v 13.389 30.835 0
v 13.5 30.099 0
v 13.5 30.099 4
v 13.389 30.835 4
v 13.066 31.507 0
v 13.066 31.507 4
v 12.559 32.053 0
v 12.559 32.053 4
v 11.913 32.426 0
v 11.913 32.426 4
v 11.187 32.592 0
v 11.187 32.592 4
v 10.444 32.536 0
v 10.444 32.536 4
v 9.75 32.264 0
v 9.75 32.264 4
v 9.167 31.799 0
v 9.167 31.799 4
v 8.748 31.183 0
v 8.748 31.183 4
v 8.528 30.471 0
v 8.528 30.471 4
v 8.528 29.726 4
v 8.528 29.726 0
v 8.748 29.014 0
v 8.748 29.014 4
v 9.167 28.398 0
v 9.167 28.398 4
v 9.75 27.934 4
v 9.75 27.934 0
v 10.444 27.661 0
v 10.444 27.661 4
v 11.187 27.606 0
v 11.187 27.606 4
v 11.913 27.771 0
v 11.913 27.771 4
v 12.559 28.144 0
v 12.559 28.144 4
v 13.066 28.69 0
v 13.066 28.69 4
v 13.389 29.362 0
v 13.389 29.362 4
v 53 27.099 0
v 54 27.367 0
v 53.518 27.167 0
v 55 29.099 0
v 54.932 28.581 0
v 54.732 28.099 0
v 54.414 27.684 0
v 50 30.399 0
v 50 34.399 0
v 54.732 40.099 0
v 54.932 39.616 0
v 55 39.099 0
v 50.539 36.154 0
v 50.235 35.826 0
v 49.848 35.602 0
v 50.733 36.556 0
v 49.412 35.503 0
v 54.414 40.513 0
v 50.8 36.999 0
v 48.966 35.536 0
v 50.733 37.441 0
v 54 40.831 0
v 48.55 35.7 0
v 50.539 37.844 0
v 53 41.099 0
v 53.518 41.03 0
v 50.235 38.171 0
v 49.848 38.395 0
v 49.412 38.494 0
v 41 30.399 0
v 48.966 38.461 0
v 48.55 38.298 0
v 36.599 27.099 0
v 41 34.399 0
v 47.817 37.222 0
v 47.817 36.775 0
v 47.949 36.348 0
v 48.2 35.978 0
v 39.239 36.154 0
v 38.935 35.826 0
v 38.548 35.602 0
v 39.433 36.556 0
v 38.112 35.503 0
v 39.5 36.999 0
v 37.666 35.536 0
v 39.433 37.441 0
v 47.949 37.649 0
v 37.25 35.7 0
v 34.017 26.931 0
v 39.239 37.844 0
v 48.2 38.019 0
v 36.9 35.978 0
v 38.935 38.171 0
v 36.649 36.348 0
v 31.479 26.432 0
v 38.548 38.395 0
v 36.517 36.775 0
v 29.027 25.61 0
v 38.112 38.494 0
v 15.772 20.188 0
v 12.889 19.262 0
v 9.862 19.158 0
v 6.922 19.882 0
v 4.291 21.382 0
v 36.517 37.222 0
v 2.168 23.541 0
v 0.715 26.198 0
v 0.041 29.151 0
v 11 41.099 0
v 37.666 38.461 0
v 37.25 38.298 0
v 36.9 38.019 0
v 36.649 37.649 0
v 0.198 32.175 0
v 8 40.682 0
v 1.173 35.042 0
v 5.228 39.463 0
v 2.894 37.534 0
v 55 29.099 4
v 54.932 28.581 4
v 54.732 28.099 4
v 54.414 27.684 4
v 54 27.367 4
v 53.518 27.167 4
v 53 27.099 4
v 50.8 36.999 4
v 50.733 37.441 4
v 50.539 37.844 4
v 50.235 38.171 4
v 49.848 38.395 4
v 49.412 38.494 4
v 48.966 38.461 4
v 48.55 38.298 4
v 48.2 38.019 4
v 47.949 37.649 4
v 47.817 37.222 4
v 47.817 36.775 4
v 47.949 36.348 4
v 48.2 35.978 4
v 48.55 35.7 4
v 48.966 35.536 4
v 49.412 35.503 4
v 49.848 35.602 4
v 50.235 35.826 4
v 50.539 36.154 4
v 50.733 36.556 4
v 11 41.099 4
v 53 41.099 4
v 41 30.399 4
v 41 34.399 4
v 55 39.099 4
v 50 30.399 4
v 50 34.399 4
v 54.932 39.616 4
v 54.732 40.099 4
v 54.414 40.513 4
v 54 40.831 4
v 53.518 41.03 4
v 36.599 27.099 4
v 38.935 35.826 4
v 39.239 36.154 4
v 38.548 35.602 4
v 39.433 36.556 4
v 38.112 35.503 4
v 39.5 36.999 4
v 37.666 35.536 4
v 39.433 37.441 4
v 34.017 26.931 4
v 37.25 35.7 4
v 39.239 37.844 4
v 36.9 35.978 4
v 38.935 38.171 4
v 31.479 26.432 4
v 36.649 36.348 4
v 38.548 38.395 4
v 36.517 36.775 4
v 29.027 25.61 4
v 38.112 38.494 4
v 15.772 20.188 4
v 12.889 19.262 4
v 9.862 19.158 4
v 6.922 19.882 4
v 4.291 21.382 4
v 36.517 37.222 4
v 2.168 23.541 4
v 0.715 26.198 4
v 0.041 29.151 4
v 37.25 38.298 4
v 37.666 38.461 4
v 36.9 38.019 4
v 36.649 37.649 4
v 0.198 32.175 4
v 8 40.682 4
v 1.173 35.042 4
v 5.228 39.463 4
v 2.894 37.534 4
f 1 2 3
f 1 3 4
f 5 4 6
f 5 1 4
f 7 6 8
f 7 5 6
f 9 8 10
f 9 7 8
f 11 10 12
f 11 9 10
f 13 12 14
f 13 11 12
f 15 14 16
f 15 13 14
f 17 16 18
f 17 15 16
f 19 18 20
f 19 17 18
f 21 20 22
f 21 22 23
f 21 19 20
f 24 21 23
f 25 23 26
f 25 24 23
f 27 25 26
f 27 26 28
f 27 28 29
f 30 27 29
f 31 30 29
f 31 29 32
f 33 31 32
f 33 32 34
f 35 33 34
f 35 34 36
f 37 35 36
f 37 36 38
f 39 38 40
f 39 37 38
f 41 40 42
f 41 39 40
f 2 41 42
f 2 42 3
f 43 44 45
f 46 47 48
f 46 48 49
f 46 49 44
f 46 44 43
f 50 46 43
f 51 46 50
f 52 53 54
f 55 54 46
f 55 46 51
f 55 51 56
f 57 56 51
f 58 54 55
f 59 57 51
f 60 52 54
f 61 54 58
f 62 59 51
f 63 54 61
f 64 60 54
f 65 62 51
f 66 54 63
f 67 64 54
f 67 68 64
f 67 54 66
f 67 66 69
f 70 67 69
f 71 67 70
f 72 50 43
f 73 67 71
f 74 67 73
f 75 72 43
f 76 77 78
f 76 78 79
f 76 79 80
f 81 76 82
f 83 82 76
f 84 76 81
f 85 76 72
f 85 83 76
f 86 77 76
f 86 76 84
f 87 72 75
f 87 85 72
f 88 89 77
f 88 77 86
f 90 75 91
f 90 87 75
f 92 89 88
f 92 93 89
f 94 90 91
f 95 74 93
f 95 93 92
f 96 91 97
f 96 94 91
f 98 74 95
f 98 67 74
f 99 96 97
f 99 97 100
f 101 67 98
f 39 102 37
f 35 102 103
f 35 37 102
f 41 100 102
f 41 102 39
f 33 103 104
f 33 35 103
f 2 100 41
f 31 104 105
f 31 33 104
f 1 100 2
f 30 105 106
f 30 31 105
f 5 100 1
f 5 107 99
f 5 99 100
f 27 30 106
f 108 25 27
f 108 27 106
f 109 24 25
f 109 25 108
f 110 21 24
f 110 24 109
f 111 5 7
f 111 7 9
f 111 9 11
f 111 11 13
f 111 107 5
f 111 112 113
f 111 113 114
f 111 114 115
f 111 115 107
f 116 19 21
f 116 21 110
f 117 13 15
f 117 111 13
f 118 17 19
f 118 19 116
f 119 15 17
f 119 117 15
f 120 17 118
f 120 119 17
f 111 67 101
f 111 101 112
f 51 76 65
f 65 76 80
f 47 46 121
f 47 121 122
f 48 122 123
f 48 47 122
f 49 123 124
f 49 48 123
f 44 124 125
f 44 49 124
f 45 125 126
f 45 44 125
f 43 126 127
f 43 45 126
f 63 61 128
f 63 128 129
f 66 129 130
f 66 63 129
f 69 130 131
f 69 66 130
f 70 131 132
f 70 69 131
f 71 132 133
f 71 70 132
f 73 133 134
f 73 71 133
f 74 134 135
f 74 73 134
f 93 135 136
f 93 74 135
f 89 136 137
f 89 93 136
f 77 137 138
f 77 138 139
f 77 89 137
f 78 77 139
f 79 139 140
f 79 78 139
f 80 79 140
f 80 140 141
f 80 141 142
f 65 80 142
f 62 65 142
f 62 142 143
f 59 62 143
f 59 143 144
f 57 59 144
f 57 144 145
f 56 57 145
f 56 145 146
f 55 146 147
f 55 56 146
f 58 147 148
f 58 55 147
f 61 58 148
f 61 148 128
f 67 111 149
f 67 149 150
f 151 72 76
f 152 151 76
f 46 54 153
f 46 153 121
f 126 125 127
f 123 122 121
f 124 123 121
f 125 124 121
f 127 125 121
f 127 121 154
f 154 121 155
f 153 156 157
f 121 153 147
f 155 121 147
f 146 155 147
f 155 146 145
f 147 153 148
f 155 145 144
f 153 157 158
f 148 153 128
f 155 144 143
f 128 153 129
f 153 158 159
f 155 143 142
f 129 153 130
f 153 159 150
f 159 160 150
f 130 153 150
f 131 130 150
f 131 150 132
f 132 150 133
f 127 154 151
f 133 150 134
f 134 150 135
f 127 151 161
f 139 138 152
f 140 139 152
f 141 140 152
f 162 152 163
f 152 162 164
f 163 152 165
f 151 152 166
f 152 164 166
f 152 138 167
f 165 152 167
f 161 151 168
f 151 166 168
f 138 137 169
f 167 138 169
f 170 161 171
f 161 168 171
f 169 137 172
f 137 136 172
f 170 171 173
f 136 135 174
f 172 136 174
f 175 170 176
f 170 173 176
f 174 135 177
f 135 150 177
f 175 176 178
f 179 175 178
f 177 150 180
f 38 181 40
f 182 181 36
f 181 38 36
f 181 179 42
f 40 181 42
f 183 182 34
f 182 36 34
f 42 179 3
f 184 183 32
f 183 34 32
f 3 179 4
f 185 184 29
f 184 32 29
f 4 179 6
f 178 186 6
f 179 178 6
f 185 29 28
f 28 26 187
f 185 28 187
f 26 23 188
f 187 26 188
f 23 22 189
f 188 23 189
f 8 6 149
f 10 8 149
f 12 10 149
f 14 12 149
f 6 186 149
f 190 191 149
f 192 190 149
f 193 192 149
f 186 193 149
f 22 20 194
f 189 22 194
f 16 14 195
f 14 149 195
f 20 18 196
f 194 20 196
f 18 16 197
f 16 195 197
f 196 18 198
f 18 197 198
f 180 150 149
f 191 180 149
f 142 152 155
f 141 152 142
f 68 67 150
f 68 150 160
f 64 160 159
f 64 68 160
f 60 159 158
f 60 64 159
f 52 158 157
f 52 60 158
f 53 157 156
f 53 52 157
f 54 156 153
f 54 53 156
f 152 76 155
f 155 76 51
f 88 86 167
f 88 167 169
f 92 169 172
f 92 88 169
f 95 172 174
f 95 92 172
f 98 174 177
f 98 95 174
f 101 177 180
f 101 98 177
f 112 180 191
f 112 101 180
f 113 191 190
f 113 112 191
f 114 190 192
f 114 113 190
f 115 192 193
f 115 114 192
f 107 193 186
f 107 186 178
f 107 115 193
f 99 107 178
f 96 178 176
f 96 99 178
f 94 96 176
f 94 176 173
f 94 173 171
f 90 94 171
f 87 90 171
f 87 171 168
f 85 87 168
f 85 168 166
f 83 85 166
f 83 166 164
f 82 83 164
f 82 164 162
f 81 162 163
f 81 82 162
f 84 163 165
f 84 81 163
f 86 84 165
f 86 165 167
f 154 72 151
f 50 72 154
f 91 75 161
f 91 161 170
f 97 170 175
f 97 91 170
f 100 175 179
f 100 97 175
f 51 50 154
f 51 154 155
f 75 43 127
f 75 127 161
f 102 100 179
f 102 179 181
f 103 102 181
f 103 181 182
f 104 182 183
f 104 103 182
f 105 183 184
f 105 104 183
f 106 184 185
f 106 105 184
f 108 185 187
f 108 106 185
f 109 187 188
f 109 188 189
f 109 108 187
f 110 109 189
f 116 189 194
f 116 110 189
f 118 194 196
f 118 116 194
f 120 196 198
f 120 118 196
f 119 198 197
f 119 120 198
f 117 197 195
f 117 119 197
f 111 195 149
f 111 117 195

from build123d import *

# Parameters (mm, degrees)
SKETCH1_R           = 1.5
SKETCH1_R_2         = 2.5
SKETCH1_W           = 9
SKETCH1_H           = 4
BOSS_EXTRUDE1_DEPTH = 4


with BuildPart() as part:
    # Sketch1 → Boss-Extrude1 (new body)
    with BuildSketch(Plane.XY):
        with BuildLine():
            Line((55, 39.098584833), (55, 29.098584833))
            ThreePointArc((55, 29.098584833), (54.414213562, 27.684371271), (53, 27.098584833))
            Line((53, 27.098584833), (36.598884751, 27.098584833))
            ThreePointArc((36.598884751, 27.098584833), (32.740210108, 26.722820615), (29.026530651, 25.609647833))
            Line((29.026530651, 25.609647833), (15.772178259, 20.187665872))
            ThreePointArc((15.772178259, 20.187665872), (0.275725932, 27.651148274), (11, 41.098584833))
            Line((11, 41.098584833), (53, 41.098584833))
            ThreePointArc((53, 41.098584833), (54.414213562, 40.512798396), (55, 39.098584833))
        make_face()
        with Locations((38, 36.998584833)):
            Circle(SKETCH1_R, mode=Mode.SUBTRACT)
        with Locations((49.3, 36.998584833)):
            Circle(SKETCH1_R, mode=Mode.SUBTRACT)
        with Locations((11, 30.098584833)):
            Circle(SKETCH1_R_2, mode=Mode.SUBTRACT)
        with Locations((45.5, 32.398584833)):
            Rectangle(SKETCH1_W, SKETCH1_H, mode=Mode.SUBTRACT)
    extrude(amount=BOSS_EXTRUDE1_DEPTH)


solid = part.part
